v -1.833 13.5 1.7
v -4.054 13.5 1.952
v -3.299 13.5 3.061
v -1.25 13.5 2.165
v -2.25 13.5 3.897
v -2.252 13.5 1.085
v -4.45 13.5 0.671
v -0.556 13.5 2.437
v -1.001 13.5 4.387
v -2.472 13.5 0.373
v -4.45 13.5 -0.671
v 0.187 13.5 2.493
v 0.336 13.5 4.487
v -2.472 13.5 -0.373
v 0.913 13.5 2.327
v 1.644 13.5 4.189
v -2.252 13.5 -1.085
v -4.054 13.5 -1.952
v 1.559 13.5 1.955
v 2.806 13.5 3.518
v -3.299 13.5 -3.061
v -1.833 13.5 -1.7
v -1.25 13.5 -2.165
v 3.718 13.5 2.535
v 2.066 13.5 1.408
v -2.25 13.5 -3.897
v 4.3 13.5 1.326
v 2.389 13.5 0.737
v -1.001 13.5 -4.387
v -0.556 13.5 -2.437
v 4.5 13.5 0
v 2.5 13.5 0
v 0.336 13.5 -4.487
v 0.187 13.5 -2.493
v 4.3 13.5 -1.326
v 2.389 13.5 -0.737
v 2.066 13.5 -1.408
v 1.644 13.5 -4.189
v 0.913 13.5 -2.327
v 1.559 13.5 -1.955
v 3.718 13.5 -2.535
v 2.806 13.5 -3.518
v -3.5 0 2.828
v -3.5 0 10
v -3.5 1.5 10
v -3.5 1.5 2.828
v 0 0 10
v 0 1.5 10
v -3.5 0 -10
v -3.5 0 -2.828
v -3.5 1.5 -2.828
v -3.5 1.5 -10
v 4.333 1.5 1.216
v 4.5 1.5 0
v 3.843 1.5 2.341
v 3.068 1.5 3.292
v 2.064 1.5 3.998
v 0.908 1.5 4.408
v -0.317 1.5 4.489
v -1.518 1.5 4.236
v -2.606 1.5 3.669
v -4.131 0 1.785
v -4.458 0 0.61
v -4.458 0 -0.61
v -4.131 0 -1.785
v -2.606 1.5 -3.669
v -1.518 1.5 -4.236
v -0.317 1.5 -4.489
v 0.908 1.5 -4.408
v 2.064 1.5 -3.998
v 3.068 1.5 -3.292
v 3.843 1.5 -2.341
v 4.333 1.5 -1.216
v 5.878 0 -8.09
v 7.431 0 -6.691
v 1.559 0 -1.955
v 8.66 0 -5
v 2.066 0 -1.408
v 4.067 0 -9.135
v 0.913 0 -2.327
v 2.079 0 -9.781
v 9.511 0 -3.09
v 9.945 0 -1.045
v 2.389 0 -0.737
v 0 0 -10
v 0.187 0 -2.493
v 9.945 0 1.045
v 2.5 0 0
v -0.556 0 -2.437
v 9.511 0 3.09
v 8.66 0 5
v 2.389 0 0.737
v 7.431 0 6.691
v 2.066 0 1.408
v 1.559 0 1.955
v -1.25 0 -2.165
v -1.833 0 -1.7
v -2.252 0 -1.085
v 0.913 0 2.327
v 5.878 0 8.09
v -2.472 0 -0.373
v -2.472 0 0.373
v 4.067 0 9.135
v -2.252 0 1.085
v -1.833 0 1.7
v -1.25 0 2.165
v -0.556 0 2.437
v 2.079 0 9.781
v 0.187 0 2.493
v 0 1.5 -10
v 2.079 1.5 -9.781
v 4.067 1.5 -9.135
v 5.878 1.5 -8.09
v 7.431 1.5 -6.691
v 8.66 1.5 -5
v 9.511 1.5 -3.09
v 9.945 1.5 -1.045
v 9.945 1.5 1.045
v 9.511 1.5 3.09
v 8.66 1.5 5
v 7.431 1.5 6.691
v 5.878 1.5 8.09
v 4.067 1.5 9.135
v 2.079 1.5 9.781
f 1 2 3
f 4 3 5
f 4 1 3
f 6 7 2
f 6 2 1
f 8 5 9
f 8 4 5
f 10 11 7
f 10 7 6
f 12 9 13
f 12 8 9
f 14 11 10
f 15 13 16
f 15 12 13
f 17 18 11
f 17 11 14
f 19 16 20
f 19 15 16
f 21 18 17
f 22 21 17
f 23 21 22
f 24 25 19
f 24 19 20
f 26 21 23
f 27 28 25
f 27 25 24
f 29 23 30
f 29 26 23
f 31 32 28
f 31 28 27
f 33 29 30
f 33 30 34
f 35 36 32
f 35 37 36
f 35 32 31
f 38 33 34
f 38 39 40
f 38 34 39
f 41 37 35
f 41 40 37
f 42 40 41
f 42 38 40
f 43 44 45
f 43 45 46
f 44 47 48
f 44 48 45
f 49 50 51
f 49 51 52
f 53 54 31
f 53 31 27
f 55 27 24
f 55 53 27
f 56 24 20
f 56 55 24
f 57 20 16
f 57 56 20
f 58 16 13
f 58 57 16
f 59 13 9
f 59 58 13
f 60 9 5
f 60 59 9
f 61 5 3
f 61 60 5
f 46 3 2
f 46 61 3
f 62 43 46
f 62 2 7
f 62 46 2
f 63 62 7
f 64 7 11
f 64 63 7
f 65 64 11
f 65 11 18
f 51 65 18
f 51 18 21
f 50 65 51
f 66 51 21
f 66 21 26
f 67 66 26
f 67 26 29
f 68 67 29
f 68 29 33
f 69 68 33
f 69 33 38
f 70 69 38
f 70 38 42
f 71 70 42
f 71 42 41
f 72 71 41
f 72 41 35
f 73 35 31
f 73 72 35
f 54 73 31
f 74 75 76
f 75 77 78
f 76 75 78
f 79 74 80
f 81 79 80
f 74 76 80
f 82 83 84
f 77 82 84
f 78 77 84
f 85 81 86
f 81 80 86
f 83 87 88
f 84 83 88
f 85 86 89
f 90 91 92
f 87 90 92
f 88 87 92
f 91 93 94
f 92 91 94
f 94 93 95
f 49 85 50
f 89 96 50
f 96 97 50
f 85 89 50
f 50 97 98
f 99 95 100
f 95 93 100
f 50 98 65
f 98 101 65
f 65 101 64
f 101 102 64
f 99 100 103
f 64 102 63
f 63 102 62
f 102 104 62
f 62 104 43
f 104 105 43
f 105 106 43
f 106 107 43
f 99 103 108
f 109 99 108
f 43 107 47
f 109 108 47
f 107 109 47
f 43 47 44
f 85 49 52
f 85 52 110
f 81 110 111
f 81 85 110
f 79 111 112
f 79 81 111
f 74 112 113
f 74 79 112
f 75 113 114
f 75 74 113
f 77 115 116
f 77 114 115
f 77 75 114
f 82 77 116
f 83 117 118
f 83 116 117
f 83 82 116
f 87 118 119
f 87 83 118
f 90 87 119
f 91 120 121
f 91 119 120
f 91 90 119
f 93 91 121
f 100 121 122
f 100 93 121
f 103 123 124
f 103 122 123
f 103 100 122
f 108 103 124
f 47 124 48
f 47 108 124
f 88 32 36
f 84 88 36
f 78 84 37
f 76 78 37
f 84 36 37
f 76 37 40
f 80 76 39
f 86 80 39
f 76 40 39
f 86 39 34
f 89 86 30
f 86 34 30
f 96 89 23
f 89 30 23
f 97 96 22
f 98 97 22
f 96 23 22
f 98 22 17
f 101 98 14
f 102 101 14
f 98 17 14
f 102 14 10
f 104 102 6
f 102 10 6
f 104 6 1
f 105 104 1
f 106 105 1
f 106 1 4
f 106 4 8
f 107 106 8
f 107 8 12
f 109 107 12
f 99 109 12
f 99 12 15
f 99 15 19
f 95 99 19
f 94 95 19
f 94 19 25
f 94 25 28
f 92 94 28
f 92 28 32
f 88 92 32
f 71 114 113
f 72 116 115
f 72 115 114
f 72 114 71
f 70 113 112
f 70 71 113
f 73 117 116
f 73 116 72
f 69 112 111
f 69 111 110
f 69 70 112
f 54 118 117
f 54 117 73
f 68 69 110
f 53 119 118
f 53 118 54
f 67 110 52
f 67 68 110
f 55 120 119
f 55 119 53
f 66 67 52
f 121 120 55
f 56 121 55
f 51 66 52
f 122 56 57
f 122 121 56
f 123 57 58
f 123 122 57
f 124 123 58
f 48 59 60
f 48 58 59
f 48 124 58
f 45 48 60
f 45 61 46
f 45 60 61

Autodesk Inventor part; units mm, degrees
ref_plane "YZ Plane" through (0, 0, 0) normal (1, 0, 0) x (0, 1, 0)
ref_plane "XZ Plane" through (0, 0, 0) normal (0, 1, 0) x (-1, 0, 0)
ref_plane "XY Plane" through (0, 0, 0) normal (0, 0, 1) x (1, 0, 0)
sketch "Sketch1" plane through (0, 0, 0) normal (0, 1, 0) x (-1, 0, 0)
  circle A0 centre (0, 0) radius 10
  line L0 (0, 10) -> (0, -10)
  line L1 (0, 10) -> (3.5, 10)
  line L2 (3.5, 10) -> (3.5, -10)
  line L3 (3.5, -10) -> (0, -10)
  dimension "d0" = 20
  dimension "d3" = 3.5
extrude "Extrusion1" add sketch "Sketch1" along normal blind 1.5 contours L0 A0 | L1 L2 A0 | A0 L2 L0 | A0 L2 L3
sketch "Sketch3" plane through (0, 1.5, 0) normal (0, 1, 0) x (1, 0, 0)
  circle A0 centre (0, 0) radius 4.5
  circle A1 centre (0, 0) radius 2.5
  dimension "d8" = 9
  dimension "d18" = 5
extrude "Extrusion3" add sketch "Sketch3" along normal blind 10 and the other way blind 1.5
sketch "Sketch4" plane through (0, 11.5, 0) normal (0, 1, 0) x (1, 0, 0)
  line L0 (-3.5, 10) -> (-3.5, 2.8284) projected
  circle A0 centre (0, 0) radius 4.5
  circle A1 centre (0, 0) radius 2.5
  dimension "d13" = 5
extrude "Extrusion4" add sketch "Sketch4" along normal blind 2 and the other way blind 3
sketch "Sketch2" plane through (0, 1.5, 0) normal (0, 1, 0) x (1, 0, 0)
  circle A0 centre (0, 0) radius 2.5
  circle A1 centre (0, 0) radius 4.5
  dimension "d4" = 5
  dimension "d5" = 9
extrude "Extrusion2" cut sketch "Sketch2" against normal blind 1.5 contours A0
properties part number "Fluorescence_fiber_holder"
